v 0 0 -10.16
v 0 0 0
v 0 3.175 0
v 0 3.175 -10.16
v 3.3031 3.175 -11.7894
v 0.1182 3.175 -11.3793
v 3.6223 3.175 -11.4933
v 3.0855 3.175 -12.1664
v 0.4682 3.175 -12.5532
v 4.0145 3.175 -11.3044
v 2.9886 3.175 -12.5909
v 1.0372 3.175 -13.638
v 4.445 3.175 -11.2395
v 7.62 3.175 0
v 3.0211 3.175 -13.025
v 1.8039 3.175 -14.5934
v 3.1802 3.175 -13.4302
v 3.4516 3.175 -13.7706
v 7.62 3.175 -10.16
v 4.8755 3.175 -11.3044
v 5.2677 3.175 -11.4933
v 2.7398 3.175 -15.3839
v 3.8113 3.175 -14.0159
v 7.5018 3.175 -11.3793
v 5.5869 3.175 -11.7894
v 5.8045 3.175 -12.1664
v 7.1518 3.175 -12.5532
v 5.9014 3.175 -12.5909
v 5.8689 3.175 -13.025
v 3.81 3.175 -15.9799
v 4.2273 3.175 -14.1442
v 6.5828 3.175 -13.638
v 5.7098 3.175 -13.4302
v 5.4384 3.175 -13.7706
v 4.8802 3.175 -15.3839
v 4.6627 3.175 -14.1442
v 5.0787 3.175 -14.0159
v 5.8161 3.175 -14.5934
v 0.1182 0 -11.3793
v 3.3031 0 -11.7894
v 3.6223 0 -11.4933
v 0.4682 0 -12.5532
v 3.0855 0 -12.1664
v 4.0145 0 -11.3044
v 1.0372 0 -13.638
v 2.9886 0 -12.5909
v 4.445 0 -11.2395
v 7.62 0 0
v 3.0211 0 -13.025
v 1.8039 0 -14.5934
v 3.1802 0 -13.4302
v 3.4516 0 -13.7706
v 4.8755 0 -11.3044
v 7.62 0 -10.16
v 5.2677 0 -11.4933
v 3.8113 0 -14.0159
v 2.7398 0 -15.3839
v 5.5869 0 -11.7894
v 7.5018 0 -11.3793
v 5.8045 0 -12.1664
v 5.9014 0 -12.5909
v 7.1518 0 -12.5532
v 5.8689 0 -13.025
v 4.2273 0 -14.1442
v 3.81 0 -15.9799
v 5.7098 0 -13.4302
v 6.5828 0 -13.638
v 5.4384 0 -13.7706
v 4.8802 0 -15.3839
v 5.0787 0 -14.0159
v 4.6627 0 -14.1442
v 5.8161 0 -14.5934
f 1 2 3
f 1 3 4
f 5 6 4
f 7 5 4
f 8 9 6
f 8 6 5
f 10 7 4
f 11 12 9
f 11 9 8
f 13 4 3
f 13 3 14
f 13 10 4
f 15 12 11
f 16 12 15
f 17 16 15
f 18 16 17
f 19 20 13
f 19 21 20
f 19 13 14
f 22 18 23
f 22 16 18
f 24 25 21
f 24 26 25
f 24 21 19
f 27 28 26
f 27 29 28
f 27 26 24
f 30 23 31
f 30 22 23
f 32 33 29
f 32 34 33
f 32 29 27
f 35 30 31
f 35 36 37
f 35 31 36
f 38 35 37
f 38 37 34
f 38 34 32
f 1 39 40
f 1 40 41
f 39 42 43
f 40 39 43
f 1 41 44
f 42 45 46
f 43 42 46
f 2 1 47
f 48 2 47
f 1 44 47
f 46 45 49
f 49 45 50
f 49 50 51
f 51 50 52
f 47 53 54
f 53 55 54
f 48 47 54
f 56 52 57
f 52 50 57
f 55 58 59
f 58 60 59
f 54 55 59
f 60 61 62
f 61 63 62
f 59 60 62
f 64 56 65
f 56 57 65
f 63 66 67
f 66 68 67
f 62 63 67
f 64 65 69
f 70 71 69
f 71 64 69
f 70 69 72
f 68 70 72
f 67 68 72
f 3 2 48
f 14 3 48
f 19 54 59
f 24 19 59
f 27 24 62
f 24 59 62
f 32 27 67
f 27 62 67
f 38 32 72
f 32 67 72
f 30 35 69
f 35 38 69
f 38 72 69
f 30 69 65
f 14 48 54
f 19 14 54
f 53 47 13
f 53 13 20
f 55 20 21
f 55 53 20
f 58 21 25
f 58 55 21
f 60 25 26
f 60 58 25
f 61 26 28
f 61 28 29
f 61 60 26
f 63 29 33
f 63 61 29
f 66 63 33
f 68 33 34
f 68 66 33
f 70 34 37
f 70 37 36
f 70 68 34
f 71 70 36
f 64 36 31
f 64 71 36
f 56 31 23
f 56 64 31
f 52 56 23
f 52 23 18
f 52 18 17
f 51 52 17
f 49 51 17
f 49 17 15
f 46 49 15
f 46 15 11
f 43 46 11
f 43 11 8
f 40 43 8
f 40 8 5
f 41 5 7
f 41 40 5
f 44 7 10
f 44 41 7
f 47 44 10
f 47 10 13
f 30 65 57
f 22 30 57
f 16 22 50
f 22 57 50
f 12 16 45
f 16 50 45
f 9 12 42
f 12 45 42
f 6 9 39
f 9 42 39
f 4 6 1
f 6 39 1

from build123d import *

# Parameters (mm, degrees)
SKETCH1_W           = 7.62
SKETCH1_H           = 16.51
SKETCH1_R           = 1.4605
BOSS_EXTRUDE1_DEPTH = 3.175
FILLET3_R           = 6.35


with BuildPart() as part:
    # Sketch1 → Boss-Extrude1 (new body)
    with BuildSketch(Plane(origin=(0, 0, 0), x_dir=(1, 0, 0), z_dir=(0, 1, 0))):
        with Locations((3.81, 8.255)):
            Rectangle(SKETCH1_W, SKETCH1_H)
        with Locations(Location((4.445, 12.7, 0), (0, 0, 270))):
            Circle(SKETCH1_R, mode=Mode.SUBTRACT)
    extrude(amount=BOSS_EXTRUDE1_DEPTH)

    # Fillet3
    # the kernel refuses this fillet: 6.35 mm, written as the material it takes off along each edge
    with BuildSketch(Plane(origin=(0, -15.875, -16.51), x_dir=(1, 0, 0), z_dir=(0, 1, 0)), Plane(origin=(7.62, -15.875, -16.51), x_dir=(0, 0, 1), z_dir=(0, 1, 0))) as fillet3_piece_1:
        with BuildLine():
            CenterArc((FILLET3_R, -FILLET3_R), FILLET3_R, 90, 90)
            Line((0, -FILLET3_R), (0, 0))
            Line((0, 0), (FILLET3_R, 0))
        make_face()
    extrude(amount=34.925, mode=Mode.SUBTRACT)


solid = part.part
